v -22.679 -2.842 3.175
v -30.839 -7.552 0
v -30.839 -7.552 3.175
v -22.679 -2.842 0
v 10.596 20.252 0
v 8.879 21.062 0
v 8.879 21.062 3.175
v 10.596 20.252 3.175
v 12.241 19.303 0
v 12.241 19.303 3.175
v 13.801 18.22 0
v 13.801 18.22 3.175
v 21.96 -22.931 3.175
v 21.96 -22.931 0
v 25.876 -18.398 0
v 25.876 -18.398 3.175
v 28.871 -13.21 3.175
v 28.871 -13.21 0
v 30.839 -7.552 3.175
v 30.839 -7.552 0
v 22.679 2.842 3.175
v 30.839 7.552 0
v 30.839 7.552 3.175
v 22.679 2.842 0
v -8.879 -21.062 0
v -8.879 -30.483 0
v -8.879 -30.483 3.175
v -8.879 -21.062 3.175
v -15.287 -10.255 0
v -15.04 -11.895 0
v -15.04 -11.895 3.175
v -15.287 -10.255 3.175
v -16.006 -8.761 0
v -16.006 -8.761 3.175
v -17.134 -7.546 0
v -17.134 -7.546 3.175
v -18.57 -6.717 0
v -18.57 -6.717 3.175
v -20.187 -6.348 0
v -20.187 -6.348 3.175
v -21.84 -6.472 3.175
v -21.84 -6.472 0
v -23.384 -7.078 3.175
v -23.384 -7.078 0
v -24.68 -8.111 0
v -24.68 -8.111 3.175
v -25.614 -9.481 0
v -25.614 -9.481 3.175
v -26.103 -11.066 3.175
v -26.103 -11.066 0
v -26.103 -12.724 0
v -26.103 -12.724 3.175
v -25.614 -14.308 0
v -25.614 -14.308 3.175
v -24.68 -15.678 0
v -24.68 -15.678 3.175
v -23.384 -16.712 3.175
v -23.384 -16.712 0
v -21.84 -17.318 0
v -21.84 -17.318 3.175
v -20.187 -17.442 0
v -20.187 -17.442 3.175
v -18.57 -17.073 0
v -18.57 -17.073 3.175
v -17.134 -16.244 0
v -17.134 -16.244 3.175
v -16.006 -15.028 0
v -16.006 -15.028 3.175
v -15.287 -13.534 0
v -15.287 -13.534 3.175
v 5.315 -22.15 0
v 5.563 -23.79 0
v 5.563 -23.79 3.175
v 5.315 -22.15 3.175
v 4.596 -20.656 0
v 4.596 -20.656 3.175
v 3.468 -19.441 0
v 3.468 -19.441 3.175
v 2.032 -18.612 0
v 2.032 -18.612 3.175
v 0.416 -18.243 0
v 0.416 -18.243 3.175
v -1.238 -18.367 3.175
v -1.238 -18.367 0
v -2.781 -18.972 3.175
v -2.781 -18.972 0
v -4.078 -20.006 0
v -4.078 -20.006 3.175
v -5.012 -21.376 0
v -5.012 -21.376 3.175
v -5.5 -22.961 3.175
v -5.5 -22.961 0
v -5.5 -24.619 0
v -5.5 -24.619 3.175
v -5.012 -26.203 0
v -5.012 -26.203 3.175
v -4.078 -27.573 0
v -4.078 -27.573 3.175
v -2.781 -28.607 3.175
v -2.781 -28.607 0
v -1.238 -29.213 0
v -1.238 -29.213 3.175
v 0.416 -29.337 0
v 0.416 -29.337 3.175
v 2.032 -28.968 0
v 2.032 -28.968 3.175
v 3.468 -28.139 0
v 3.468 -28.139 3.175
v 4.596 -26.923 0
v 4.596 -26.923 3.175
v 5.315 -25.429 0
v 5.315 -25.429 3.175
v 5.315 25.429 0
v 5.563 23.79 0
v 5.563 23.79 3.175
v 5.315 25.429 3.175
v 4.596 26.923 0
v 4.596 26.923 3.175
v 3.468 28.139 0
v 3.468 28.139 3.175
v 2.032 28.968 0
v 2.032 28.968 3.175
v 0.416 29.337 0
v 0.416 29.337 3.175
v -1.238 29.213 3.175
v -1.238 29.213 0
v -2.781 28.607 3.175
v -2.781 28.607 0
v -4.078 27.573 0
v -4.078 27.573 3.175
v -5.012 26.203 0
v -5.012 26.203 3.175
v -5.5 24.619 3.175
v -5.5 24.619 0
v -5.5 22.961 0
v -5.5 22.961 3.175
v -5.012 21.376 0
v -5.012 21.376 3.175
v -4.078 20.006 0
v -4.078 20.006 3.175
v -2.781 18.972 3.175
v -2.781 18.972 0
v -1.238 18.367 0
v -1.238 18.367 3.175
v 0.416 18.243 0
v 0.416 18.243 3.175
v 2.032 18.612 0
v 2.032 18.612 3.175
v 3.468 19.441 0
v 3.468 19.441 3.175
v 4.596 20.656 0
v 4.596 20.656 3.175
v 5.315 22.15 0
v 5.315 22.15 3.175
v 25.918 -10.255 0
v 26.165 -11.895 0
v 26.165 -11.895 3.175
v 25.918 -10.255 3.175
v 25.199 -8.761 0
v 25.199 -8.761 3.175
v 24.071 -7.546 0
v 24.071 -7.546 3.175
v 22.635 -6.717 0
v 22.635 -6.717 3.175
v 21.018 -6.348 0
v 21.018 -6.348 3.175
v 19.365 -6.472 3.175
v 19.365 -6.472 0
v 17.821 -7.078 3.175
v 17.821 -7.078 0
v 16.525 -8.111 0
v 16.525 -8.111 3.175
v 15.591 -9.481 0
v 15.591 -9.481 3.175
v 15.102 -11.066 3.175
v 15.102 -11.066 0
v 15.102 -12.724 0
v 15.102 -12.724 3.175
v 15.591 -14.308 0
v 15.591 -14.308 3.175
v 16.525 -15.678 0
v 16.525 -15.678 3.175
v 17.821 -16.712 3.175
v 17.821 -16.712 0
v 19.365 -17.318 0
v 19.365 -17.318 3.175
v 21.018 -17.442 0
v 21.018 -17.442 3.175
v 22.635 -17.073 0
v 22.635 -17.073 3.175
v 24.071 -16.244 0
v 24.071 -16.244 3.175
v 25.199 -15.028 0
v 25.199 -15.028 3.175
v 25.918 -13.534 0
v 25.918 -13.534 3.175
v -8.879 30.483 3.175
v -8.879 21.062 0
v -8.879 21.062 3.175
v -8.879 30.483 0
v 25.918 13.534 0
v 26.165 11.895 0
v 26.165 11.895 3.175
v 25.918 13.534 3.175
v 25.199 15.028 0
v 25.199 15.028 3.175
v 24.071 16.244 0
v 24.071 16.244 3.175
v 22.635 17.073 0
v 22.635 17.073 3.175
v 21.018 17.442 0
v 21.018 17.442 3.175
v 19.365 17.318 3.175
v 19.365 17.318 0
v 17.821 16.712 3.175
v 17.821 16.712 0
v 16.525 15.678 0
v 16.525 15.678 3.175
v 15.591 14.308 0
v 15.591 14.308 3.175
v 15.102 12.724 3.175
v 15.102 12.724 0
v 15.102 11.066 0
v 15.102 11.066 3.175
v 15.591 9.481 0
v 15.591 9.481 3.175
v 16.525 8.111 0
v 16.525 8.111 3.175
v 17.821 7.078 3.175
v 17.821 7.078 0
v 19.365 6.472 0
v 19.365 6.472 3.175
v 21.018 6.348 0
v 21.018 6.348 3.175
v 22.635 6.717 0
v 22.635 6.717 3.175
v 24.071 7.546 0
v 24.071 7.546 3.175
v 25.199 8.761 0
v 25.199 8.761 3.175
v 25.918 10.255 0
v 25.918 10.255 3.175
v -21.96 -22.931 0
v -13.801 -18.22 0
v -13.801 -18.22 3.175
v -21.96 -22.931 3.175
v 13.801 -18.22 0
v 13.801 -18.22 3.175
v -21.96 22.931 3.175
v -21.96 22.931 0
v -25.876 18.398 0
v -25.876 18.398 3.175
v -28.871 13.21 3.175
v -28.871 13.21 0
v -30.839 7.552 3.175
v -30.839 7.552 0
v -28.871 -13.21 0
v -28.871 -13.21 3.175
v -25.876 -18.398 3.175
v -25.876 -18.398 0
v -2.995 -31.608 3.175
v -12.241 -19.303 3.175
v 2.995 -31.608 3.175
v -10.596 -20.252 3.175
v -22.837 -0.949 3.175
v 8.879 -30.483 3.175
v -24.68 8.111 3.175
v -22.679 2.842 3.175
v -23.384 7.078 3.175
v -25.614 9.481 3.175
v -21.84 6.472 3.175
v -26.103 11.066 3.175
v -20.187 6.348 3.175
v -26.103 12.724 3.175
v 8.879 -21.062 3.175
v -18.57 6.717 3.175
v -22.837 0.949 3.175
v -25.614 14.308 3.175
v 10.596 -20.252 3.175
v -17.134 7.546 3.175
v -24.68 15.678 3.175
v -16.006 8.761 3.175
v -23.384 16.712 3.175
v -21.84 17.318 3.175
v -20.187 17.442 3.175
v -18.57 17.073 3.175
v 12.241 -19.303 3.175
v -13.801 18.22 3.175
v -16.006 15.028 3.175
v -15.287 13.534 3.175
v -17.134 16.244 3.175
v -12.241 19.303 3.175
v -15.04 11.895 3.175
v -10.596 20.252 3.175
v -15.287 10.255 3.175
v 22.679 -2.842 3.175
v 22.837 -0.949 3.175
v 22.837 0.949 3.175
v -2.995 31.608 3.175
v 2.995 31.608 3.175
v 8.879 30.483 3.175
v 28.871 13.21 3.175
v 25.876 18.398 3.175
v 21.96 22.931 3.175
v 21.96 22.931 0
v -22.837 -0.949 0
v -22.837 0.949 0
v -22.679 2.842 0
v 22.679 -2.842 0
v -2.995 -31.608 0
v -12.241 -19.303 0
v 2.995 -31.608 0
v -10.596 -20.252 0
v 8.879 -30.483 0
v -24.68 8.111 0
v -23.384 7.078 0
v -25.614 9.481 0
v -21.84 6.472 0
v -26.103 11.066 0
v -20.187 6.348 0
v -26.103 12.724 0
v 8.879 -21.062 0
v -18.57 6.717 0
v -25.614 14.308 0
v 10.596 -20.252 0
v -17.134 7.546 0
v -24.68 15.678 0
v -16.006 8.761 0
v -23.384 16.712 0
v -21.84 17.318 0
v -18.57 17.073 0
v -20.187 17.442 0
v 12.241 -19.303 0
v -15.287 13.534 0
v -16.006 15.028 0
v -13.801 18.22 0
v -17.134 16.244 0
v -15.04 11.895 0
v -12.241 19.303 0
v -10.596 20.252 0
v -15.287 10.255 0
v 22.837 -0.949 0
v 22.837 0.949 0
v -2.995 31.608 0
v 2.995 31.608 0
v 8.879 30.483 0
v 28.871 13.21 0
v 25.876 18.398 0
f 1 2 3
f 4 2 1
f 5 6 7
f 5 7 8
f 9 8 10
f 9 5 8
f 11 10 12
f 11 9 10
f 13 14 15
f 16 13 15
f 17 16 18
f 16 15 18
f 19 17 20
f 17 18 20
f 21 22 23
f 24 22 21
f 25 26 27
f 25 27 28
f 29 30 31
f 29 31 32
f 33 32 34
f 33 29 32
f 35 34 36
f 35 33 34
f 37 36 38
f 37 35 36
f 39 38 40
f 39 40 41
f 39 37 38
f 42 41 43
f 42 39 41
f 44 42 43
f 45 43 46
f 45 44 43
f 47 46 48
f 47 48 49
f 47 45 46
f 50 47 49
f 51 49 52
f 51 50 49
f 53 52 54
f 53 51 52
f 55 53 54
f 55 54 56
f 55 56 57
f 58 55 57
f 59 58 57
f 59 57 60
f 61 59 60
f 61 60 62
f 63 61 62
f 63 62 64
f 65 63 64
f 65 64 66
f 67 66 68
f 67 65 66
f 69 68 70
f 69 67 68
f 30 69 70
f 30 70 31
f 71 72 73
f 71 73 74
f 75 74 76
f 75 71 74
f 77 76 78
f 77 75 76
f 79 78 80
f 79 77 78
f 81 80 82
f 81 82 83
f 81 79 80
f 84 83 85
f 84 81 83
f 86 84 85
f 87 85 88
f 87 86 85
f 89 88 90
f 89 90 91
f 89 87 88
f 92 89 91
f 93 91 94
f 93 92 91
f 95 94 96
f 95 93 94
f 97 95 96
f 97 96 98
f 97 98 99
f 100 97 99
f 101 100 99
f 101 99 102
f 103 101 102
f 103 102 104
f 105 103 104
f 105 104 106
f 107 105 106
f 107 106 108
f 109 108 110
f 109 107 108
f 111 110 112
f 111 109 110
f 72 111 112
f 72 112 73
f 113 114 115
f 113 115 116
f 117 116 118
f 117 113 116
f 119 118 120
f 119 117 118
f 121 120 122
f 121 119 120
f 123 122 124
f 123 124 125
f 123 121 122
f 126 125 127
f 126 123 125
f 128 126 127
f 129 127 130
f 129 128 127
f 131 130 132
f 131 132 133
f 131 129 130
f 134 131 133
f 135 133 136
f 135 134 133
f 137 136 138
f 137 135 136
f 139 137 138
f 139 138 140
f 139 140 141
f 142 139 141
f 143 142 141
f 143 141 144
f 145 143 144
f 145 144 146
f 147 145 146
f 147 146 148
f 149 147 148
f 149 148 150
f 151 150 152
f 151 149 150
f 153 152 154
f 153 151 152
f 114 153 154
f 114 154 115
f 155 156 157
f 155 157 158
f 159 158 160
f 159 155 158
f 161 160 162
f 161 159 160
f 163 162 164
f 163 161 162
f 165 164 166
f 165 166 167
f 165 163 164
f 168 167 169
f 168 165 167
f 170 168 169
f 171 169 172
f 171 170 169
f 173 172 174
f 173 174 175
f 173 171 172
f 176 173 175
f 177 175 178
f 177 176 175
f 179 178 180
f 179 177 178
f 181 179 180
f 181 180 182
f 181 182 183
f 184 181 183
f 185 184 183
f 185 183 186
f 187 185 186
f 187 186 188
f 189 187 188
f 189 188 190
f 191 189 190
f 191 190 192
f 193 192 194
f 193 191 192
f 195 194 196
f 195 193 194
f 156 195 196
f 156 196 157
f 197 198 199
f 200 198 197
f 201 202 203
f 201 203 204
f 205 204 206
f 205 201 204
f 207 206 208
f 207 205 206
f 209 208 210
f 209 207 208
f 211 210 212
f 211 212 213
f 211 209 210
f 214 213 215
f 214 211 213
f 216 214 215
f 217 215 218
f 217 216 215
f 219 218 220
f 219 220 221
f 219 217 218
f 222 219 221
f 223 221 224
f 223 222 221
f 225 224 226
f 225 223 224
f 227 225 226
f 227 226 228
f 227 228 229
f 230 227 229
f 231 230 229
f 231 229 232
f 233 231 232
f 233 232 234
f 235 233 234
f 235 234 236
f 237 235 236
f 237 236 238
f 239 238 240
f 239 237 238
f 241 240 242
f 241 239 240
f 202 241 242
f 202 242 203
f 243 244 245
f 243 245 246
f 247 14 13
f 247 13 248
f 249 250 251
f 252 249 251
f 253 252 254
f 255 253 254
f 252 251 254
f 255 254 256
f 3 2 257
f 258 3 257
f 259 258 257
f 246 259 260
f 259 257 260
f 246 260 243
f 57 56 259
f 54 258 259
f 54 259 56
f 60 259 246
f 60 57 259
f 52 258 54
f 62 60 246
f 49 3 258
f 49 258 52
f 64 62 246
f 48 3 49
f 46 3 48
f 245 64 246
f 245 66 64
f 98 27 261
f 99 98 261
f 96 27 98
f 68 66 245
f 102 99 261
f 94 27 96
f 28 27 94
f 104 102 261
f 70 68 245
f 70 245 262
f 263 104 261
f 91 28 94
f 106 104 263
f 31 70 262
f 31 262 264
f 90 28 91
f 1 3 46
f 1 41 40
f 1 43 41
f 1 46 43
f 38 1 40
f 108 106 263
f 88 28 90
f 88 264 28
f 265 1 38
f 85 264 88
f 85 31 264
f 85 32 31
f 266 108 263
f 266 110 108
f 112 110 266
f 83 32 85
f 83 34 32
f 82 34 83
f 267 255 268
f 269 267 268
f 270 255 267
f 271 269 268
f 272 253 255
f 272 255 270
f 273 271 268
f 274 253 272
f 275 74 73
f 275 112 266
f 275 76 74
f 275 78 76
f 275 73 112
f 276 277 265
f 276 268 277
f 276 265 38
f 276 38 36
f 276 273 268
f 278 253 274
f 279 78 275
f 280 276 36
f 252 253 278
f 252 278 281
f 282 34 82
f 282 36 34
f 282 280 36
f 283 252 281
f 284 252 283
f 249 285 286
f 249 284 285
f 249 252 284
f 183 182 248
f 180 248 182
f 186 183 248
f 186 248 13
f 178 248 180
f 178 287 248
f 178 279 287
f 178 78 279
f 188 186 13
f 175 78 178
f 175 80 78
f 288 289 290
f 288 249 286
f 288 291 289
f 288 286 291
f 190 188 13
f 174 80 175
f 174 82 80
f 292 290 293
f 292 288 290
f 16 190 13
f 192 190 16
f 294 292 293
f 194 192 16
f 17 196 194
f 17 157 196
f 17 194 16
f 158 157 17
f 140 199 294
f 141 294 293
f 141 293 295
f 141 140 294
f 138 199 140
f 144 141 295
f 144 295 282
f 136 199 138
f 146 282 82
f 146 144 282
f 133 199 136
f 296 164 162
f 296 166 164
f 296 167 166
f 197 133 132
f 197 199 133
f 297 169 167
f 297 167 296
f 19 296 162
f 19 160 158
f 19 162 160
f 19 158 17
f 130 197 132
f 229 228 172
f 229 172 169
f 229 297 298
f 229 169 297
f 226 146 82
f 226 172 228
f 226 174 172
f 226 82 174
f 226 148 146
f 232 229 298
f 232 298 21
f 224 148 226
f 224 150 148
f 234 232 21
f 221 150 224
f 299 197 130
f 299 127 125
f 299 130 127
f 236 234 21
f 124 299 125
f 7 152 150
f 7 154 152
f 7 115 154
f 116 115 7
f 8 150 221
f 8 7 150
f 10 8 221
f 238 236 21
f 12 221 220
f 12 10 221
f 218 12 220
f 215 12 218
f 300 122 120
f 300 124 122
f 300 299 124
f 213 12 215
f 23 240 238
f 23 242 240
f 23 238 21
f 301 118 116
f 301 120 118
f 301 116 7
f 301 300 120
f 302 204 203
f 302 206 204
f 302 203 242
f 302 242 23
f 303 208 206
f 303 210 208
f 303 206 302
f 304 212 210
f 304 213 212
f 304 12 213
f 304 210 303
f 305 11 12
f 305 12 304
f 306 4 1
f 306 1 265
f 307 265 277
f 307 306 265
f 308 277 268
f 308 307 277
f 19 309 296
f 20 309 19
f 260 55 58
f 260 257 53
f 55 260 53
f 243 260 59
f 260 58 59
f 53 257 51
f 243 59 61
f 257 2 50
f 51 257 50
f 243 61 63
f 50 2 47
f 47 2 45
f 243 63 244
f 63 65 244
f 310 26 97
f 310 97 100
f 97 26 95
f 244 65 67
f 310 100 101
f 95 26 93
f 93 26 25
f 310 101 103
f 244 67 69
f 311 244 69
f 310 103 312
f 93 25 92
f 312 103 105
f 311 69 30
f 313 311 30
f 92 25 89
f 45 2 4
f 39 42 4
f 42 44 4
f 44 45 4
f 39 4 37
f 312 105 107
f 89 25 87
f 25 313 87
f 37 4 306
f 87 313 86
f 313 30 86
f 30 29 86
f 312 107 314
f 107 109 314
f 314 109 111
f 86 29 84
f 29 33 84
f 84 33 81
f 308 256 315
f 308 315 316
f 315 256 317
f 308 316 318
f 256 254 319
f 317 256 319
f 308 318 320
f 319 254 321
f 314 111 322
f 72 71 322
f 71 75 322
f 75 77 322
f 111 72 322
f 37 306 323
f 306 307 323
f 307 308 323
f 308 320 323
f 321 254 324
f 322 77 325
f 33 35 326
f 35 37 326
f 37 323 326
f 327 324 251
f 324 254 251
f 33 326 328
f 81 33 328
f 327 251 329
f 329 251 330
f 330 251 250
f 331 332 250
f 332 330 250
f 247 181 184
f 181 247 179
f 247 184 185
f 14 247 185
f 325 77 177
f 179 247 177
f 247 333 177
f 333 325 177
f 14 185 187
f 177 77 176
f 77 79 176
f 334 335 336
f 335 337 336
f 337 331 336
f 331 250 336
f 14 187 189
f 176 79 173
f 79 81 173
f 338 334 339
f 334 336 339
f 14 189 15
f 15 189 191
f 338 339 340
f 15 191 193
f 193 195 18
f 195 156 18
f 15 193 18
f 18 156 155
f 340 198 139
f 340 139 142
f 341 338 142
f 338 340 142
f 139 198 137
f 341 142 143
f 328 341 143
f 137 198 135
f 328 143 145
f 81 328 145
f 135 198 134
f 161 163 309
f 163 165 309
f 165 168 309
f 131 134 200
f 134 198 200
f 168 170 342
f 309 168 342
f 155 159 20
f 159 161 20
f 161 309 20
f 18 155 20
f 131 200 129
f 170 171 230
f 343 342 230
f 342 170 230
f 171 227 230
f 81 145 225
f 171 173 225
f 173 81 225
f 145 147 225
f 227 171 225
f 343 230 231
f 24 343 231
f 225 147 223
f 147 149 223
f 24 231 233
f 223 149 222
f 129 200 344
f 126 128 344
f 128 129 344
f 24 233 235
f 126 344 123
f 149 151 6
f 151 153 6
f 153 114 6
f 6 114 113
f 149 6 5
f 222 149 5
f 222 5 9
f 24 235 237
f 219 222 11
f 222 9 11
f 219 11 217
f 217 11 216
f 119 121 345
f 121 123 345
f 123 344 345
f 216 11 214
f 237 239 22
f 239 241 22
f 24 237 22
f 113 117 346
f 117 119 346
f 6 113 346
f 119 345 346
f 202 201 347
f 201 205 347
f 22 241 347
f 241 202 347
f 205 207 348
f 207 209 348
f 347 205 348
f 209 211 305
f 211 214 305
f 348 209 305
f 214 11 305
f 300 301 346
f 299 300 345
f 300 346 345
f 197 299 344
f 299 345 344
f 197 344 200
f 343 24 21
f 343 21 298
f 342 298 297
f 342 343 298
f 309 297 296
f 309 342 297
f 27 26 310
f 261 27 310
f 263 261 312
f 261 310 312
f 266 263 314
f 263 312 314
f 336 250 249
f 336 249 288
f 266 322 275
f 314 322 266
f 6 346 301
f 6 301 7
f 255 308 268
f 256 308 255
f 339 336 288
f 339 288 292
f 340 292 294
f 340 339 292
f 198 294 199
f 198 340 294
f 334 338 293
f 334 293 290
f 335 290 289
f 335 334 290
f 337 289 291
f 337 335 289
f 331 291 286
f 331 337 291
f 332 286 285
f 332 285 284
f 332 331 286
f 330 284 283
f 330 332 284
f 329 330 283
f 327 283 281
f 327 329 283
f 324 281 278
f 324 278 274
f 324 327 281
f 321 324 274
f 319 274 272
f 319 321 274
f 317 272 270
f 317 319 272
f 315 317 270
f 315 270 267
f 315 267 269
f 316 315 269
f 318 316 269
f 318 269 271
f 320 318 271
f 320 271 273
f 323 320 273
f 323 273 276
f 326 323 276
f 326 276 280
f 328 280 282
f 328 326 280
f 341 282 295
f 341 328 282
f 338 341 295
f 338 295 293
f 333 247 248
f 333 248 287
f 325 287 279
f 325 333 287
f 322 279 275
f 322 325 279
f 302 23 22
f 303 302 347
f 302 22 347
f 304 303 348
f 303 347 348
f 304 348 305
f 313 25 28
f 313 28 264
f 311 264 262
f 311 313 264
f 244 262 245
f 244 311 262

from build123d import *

# Parameters (mm, degrees)
SKETCH1_R          = 31.75
SKETCH1_R_2        = 5.5626
EXTRUDE1_DEPTH     = 3.175
CUT_EXTRUDE1_DEPTH = 4.175


with BuildPart() as part:
    # Sketch1 → Extrude1 (new body)
    with BuildSketch(Plane.XY):
        Circle(SKETCH1_R)
        with Locations((0, 23.78973844)):
            Circle(SKETCH1_R_2, mode=Mode.SUBTRACT)
        with Locations((20.602517839, 11.89486922)):
            Circle(SKETCH1_R_2, mode=Mode.SUBTRACT)
        with Locations((20.602517839, -11.89486922)):
            Circle(SKETCH1_R_2, mode=Mode.SUBTRACT)
        with Locations((0, -23.78973844)):
            Circle(SKETCH1_R_2, mode=Mode.SUBTRACT)
        with Locations((-20.602517839, -11.89486922)):
            Circle(SKETCH1_R_2, mode=Mode.SUBTRACT)
        with Locations((-20.602517839, 11.89486922)):
            Circle(SKETCH1_R_2, mode=Mode.SUBTRACT)
    extrude(amount=EXTRUDE1_DEPTH)

    # Sketch2 → Cut-Extrude1 (cut, through all)
    with BuildSketch(Plane(origin=(0, 0, 0), x_dir=(-1, 0, 0), z_dir=(0, 0, -1))):
        with BuildLine():
            Line((8.878771943, 21.061731462), (8.878771943, 30.483272606))
            ThreePointArc((8.878771943, 30.483272606), (15.875, 27.49630657), (21.959902496, 22.93087836))
            Line((21.959902496, 22.93087836), (13.800608523, 18.220107788))
            ThreePointArc((13.800608523, 18.220107788), (11.42835425, 19.794490207), (8.878771943, 21.061731462))
        make_face()
        with BuildLine():
            Line((-8.878771943, 30.483272606), (-8.878771943, 21.061731462))
            ThreePointArc((-8.878771943, 21.061731462), (-11.42835425, 19.794490207), (-13.800608523, 18.220107788))
            Line((-13.800608523, 18.220107788), (-21.959902496, 22.93087836))
            ThreePointArc((-21.959902496, 22.93087836), (-15.875, 27.49630657), (-8.878771943, 30.483272606))
        make_face()
        with BuildLine():
            Line((22.679380466, 2.841623674), (30.838674439, 7.552394246))
            ThreePointArc((30.838674439, 7.552394246), (31.75, 0), (30.838674439, -7.552394246))
            Line((30.838674439, -7.552394246), (22.679380466, -2.841623674))
            ThreePointArc((22.679380466, -2.841623674), (22.856708499, 0), (22.679380466, 2.841623674))
        make_face()
        with BuildLine():
            Line((13.800608523, -18.220107788), (21.959902496, -22.93087836))
            ThreePointArc((21.959902496, -22.93087836), (15.875, -27.49630657), (8.878771943, -30.483272606))
            Line((8.878771943, -30.483272606), (8.878771943, -21.061731462))
            ThreePointArc((8.878771943, -21.061731462), (11.42835425, -19.794490207), (13.800608523, -18.220107788))
        make_face()
        with BuildLine():
            Line((-8.878771943, -21.061731462), (-8.878771943, -30.483272606))
            ThreePointArc((-8.878771943, -30.483272606), (-15.875, -27.49630657), (-21.959902496, -22.93087836))
            Line((-21.959902496, -22.93087836), (-13.800608523, -18.220107788))
            ThreePointArc((-13.800608523, -18.220107788), (-11.42835425, -19.794490207), (-8.878771943, -21.061731462))
        make_face()
        with BuildLine():
            Line((-22.679380466, -2.841623674), (-30.838674439, -7.552394246))
            ThreePointArc((-30.838674439, -7.552394246), (-31.75, 0), (-30.838674439, 7.552394246))
            Line((-30.838674439, 7.552394246), (-22.679380466, 2.841623674))
            ThreePointArc((-22.679380466, 2.841623674), (-22.856708499, 0), (-22.679380466, -2.841623674))
        make_face()
    extrude(amount=-CUT_EXTRUDE1_DEPTH, mode=Mode.SUBTRACT)


solid = part.part
